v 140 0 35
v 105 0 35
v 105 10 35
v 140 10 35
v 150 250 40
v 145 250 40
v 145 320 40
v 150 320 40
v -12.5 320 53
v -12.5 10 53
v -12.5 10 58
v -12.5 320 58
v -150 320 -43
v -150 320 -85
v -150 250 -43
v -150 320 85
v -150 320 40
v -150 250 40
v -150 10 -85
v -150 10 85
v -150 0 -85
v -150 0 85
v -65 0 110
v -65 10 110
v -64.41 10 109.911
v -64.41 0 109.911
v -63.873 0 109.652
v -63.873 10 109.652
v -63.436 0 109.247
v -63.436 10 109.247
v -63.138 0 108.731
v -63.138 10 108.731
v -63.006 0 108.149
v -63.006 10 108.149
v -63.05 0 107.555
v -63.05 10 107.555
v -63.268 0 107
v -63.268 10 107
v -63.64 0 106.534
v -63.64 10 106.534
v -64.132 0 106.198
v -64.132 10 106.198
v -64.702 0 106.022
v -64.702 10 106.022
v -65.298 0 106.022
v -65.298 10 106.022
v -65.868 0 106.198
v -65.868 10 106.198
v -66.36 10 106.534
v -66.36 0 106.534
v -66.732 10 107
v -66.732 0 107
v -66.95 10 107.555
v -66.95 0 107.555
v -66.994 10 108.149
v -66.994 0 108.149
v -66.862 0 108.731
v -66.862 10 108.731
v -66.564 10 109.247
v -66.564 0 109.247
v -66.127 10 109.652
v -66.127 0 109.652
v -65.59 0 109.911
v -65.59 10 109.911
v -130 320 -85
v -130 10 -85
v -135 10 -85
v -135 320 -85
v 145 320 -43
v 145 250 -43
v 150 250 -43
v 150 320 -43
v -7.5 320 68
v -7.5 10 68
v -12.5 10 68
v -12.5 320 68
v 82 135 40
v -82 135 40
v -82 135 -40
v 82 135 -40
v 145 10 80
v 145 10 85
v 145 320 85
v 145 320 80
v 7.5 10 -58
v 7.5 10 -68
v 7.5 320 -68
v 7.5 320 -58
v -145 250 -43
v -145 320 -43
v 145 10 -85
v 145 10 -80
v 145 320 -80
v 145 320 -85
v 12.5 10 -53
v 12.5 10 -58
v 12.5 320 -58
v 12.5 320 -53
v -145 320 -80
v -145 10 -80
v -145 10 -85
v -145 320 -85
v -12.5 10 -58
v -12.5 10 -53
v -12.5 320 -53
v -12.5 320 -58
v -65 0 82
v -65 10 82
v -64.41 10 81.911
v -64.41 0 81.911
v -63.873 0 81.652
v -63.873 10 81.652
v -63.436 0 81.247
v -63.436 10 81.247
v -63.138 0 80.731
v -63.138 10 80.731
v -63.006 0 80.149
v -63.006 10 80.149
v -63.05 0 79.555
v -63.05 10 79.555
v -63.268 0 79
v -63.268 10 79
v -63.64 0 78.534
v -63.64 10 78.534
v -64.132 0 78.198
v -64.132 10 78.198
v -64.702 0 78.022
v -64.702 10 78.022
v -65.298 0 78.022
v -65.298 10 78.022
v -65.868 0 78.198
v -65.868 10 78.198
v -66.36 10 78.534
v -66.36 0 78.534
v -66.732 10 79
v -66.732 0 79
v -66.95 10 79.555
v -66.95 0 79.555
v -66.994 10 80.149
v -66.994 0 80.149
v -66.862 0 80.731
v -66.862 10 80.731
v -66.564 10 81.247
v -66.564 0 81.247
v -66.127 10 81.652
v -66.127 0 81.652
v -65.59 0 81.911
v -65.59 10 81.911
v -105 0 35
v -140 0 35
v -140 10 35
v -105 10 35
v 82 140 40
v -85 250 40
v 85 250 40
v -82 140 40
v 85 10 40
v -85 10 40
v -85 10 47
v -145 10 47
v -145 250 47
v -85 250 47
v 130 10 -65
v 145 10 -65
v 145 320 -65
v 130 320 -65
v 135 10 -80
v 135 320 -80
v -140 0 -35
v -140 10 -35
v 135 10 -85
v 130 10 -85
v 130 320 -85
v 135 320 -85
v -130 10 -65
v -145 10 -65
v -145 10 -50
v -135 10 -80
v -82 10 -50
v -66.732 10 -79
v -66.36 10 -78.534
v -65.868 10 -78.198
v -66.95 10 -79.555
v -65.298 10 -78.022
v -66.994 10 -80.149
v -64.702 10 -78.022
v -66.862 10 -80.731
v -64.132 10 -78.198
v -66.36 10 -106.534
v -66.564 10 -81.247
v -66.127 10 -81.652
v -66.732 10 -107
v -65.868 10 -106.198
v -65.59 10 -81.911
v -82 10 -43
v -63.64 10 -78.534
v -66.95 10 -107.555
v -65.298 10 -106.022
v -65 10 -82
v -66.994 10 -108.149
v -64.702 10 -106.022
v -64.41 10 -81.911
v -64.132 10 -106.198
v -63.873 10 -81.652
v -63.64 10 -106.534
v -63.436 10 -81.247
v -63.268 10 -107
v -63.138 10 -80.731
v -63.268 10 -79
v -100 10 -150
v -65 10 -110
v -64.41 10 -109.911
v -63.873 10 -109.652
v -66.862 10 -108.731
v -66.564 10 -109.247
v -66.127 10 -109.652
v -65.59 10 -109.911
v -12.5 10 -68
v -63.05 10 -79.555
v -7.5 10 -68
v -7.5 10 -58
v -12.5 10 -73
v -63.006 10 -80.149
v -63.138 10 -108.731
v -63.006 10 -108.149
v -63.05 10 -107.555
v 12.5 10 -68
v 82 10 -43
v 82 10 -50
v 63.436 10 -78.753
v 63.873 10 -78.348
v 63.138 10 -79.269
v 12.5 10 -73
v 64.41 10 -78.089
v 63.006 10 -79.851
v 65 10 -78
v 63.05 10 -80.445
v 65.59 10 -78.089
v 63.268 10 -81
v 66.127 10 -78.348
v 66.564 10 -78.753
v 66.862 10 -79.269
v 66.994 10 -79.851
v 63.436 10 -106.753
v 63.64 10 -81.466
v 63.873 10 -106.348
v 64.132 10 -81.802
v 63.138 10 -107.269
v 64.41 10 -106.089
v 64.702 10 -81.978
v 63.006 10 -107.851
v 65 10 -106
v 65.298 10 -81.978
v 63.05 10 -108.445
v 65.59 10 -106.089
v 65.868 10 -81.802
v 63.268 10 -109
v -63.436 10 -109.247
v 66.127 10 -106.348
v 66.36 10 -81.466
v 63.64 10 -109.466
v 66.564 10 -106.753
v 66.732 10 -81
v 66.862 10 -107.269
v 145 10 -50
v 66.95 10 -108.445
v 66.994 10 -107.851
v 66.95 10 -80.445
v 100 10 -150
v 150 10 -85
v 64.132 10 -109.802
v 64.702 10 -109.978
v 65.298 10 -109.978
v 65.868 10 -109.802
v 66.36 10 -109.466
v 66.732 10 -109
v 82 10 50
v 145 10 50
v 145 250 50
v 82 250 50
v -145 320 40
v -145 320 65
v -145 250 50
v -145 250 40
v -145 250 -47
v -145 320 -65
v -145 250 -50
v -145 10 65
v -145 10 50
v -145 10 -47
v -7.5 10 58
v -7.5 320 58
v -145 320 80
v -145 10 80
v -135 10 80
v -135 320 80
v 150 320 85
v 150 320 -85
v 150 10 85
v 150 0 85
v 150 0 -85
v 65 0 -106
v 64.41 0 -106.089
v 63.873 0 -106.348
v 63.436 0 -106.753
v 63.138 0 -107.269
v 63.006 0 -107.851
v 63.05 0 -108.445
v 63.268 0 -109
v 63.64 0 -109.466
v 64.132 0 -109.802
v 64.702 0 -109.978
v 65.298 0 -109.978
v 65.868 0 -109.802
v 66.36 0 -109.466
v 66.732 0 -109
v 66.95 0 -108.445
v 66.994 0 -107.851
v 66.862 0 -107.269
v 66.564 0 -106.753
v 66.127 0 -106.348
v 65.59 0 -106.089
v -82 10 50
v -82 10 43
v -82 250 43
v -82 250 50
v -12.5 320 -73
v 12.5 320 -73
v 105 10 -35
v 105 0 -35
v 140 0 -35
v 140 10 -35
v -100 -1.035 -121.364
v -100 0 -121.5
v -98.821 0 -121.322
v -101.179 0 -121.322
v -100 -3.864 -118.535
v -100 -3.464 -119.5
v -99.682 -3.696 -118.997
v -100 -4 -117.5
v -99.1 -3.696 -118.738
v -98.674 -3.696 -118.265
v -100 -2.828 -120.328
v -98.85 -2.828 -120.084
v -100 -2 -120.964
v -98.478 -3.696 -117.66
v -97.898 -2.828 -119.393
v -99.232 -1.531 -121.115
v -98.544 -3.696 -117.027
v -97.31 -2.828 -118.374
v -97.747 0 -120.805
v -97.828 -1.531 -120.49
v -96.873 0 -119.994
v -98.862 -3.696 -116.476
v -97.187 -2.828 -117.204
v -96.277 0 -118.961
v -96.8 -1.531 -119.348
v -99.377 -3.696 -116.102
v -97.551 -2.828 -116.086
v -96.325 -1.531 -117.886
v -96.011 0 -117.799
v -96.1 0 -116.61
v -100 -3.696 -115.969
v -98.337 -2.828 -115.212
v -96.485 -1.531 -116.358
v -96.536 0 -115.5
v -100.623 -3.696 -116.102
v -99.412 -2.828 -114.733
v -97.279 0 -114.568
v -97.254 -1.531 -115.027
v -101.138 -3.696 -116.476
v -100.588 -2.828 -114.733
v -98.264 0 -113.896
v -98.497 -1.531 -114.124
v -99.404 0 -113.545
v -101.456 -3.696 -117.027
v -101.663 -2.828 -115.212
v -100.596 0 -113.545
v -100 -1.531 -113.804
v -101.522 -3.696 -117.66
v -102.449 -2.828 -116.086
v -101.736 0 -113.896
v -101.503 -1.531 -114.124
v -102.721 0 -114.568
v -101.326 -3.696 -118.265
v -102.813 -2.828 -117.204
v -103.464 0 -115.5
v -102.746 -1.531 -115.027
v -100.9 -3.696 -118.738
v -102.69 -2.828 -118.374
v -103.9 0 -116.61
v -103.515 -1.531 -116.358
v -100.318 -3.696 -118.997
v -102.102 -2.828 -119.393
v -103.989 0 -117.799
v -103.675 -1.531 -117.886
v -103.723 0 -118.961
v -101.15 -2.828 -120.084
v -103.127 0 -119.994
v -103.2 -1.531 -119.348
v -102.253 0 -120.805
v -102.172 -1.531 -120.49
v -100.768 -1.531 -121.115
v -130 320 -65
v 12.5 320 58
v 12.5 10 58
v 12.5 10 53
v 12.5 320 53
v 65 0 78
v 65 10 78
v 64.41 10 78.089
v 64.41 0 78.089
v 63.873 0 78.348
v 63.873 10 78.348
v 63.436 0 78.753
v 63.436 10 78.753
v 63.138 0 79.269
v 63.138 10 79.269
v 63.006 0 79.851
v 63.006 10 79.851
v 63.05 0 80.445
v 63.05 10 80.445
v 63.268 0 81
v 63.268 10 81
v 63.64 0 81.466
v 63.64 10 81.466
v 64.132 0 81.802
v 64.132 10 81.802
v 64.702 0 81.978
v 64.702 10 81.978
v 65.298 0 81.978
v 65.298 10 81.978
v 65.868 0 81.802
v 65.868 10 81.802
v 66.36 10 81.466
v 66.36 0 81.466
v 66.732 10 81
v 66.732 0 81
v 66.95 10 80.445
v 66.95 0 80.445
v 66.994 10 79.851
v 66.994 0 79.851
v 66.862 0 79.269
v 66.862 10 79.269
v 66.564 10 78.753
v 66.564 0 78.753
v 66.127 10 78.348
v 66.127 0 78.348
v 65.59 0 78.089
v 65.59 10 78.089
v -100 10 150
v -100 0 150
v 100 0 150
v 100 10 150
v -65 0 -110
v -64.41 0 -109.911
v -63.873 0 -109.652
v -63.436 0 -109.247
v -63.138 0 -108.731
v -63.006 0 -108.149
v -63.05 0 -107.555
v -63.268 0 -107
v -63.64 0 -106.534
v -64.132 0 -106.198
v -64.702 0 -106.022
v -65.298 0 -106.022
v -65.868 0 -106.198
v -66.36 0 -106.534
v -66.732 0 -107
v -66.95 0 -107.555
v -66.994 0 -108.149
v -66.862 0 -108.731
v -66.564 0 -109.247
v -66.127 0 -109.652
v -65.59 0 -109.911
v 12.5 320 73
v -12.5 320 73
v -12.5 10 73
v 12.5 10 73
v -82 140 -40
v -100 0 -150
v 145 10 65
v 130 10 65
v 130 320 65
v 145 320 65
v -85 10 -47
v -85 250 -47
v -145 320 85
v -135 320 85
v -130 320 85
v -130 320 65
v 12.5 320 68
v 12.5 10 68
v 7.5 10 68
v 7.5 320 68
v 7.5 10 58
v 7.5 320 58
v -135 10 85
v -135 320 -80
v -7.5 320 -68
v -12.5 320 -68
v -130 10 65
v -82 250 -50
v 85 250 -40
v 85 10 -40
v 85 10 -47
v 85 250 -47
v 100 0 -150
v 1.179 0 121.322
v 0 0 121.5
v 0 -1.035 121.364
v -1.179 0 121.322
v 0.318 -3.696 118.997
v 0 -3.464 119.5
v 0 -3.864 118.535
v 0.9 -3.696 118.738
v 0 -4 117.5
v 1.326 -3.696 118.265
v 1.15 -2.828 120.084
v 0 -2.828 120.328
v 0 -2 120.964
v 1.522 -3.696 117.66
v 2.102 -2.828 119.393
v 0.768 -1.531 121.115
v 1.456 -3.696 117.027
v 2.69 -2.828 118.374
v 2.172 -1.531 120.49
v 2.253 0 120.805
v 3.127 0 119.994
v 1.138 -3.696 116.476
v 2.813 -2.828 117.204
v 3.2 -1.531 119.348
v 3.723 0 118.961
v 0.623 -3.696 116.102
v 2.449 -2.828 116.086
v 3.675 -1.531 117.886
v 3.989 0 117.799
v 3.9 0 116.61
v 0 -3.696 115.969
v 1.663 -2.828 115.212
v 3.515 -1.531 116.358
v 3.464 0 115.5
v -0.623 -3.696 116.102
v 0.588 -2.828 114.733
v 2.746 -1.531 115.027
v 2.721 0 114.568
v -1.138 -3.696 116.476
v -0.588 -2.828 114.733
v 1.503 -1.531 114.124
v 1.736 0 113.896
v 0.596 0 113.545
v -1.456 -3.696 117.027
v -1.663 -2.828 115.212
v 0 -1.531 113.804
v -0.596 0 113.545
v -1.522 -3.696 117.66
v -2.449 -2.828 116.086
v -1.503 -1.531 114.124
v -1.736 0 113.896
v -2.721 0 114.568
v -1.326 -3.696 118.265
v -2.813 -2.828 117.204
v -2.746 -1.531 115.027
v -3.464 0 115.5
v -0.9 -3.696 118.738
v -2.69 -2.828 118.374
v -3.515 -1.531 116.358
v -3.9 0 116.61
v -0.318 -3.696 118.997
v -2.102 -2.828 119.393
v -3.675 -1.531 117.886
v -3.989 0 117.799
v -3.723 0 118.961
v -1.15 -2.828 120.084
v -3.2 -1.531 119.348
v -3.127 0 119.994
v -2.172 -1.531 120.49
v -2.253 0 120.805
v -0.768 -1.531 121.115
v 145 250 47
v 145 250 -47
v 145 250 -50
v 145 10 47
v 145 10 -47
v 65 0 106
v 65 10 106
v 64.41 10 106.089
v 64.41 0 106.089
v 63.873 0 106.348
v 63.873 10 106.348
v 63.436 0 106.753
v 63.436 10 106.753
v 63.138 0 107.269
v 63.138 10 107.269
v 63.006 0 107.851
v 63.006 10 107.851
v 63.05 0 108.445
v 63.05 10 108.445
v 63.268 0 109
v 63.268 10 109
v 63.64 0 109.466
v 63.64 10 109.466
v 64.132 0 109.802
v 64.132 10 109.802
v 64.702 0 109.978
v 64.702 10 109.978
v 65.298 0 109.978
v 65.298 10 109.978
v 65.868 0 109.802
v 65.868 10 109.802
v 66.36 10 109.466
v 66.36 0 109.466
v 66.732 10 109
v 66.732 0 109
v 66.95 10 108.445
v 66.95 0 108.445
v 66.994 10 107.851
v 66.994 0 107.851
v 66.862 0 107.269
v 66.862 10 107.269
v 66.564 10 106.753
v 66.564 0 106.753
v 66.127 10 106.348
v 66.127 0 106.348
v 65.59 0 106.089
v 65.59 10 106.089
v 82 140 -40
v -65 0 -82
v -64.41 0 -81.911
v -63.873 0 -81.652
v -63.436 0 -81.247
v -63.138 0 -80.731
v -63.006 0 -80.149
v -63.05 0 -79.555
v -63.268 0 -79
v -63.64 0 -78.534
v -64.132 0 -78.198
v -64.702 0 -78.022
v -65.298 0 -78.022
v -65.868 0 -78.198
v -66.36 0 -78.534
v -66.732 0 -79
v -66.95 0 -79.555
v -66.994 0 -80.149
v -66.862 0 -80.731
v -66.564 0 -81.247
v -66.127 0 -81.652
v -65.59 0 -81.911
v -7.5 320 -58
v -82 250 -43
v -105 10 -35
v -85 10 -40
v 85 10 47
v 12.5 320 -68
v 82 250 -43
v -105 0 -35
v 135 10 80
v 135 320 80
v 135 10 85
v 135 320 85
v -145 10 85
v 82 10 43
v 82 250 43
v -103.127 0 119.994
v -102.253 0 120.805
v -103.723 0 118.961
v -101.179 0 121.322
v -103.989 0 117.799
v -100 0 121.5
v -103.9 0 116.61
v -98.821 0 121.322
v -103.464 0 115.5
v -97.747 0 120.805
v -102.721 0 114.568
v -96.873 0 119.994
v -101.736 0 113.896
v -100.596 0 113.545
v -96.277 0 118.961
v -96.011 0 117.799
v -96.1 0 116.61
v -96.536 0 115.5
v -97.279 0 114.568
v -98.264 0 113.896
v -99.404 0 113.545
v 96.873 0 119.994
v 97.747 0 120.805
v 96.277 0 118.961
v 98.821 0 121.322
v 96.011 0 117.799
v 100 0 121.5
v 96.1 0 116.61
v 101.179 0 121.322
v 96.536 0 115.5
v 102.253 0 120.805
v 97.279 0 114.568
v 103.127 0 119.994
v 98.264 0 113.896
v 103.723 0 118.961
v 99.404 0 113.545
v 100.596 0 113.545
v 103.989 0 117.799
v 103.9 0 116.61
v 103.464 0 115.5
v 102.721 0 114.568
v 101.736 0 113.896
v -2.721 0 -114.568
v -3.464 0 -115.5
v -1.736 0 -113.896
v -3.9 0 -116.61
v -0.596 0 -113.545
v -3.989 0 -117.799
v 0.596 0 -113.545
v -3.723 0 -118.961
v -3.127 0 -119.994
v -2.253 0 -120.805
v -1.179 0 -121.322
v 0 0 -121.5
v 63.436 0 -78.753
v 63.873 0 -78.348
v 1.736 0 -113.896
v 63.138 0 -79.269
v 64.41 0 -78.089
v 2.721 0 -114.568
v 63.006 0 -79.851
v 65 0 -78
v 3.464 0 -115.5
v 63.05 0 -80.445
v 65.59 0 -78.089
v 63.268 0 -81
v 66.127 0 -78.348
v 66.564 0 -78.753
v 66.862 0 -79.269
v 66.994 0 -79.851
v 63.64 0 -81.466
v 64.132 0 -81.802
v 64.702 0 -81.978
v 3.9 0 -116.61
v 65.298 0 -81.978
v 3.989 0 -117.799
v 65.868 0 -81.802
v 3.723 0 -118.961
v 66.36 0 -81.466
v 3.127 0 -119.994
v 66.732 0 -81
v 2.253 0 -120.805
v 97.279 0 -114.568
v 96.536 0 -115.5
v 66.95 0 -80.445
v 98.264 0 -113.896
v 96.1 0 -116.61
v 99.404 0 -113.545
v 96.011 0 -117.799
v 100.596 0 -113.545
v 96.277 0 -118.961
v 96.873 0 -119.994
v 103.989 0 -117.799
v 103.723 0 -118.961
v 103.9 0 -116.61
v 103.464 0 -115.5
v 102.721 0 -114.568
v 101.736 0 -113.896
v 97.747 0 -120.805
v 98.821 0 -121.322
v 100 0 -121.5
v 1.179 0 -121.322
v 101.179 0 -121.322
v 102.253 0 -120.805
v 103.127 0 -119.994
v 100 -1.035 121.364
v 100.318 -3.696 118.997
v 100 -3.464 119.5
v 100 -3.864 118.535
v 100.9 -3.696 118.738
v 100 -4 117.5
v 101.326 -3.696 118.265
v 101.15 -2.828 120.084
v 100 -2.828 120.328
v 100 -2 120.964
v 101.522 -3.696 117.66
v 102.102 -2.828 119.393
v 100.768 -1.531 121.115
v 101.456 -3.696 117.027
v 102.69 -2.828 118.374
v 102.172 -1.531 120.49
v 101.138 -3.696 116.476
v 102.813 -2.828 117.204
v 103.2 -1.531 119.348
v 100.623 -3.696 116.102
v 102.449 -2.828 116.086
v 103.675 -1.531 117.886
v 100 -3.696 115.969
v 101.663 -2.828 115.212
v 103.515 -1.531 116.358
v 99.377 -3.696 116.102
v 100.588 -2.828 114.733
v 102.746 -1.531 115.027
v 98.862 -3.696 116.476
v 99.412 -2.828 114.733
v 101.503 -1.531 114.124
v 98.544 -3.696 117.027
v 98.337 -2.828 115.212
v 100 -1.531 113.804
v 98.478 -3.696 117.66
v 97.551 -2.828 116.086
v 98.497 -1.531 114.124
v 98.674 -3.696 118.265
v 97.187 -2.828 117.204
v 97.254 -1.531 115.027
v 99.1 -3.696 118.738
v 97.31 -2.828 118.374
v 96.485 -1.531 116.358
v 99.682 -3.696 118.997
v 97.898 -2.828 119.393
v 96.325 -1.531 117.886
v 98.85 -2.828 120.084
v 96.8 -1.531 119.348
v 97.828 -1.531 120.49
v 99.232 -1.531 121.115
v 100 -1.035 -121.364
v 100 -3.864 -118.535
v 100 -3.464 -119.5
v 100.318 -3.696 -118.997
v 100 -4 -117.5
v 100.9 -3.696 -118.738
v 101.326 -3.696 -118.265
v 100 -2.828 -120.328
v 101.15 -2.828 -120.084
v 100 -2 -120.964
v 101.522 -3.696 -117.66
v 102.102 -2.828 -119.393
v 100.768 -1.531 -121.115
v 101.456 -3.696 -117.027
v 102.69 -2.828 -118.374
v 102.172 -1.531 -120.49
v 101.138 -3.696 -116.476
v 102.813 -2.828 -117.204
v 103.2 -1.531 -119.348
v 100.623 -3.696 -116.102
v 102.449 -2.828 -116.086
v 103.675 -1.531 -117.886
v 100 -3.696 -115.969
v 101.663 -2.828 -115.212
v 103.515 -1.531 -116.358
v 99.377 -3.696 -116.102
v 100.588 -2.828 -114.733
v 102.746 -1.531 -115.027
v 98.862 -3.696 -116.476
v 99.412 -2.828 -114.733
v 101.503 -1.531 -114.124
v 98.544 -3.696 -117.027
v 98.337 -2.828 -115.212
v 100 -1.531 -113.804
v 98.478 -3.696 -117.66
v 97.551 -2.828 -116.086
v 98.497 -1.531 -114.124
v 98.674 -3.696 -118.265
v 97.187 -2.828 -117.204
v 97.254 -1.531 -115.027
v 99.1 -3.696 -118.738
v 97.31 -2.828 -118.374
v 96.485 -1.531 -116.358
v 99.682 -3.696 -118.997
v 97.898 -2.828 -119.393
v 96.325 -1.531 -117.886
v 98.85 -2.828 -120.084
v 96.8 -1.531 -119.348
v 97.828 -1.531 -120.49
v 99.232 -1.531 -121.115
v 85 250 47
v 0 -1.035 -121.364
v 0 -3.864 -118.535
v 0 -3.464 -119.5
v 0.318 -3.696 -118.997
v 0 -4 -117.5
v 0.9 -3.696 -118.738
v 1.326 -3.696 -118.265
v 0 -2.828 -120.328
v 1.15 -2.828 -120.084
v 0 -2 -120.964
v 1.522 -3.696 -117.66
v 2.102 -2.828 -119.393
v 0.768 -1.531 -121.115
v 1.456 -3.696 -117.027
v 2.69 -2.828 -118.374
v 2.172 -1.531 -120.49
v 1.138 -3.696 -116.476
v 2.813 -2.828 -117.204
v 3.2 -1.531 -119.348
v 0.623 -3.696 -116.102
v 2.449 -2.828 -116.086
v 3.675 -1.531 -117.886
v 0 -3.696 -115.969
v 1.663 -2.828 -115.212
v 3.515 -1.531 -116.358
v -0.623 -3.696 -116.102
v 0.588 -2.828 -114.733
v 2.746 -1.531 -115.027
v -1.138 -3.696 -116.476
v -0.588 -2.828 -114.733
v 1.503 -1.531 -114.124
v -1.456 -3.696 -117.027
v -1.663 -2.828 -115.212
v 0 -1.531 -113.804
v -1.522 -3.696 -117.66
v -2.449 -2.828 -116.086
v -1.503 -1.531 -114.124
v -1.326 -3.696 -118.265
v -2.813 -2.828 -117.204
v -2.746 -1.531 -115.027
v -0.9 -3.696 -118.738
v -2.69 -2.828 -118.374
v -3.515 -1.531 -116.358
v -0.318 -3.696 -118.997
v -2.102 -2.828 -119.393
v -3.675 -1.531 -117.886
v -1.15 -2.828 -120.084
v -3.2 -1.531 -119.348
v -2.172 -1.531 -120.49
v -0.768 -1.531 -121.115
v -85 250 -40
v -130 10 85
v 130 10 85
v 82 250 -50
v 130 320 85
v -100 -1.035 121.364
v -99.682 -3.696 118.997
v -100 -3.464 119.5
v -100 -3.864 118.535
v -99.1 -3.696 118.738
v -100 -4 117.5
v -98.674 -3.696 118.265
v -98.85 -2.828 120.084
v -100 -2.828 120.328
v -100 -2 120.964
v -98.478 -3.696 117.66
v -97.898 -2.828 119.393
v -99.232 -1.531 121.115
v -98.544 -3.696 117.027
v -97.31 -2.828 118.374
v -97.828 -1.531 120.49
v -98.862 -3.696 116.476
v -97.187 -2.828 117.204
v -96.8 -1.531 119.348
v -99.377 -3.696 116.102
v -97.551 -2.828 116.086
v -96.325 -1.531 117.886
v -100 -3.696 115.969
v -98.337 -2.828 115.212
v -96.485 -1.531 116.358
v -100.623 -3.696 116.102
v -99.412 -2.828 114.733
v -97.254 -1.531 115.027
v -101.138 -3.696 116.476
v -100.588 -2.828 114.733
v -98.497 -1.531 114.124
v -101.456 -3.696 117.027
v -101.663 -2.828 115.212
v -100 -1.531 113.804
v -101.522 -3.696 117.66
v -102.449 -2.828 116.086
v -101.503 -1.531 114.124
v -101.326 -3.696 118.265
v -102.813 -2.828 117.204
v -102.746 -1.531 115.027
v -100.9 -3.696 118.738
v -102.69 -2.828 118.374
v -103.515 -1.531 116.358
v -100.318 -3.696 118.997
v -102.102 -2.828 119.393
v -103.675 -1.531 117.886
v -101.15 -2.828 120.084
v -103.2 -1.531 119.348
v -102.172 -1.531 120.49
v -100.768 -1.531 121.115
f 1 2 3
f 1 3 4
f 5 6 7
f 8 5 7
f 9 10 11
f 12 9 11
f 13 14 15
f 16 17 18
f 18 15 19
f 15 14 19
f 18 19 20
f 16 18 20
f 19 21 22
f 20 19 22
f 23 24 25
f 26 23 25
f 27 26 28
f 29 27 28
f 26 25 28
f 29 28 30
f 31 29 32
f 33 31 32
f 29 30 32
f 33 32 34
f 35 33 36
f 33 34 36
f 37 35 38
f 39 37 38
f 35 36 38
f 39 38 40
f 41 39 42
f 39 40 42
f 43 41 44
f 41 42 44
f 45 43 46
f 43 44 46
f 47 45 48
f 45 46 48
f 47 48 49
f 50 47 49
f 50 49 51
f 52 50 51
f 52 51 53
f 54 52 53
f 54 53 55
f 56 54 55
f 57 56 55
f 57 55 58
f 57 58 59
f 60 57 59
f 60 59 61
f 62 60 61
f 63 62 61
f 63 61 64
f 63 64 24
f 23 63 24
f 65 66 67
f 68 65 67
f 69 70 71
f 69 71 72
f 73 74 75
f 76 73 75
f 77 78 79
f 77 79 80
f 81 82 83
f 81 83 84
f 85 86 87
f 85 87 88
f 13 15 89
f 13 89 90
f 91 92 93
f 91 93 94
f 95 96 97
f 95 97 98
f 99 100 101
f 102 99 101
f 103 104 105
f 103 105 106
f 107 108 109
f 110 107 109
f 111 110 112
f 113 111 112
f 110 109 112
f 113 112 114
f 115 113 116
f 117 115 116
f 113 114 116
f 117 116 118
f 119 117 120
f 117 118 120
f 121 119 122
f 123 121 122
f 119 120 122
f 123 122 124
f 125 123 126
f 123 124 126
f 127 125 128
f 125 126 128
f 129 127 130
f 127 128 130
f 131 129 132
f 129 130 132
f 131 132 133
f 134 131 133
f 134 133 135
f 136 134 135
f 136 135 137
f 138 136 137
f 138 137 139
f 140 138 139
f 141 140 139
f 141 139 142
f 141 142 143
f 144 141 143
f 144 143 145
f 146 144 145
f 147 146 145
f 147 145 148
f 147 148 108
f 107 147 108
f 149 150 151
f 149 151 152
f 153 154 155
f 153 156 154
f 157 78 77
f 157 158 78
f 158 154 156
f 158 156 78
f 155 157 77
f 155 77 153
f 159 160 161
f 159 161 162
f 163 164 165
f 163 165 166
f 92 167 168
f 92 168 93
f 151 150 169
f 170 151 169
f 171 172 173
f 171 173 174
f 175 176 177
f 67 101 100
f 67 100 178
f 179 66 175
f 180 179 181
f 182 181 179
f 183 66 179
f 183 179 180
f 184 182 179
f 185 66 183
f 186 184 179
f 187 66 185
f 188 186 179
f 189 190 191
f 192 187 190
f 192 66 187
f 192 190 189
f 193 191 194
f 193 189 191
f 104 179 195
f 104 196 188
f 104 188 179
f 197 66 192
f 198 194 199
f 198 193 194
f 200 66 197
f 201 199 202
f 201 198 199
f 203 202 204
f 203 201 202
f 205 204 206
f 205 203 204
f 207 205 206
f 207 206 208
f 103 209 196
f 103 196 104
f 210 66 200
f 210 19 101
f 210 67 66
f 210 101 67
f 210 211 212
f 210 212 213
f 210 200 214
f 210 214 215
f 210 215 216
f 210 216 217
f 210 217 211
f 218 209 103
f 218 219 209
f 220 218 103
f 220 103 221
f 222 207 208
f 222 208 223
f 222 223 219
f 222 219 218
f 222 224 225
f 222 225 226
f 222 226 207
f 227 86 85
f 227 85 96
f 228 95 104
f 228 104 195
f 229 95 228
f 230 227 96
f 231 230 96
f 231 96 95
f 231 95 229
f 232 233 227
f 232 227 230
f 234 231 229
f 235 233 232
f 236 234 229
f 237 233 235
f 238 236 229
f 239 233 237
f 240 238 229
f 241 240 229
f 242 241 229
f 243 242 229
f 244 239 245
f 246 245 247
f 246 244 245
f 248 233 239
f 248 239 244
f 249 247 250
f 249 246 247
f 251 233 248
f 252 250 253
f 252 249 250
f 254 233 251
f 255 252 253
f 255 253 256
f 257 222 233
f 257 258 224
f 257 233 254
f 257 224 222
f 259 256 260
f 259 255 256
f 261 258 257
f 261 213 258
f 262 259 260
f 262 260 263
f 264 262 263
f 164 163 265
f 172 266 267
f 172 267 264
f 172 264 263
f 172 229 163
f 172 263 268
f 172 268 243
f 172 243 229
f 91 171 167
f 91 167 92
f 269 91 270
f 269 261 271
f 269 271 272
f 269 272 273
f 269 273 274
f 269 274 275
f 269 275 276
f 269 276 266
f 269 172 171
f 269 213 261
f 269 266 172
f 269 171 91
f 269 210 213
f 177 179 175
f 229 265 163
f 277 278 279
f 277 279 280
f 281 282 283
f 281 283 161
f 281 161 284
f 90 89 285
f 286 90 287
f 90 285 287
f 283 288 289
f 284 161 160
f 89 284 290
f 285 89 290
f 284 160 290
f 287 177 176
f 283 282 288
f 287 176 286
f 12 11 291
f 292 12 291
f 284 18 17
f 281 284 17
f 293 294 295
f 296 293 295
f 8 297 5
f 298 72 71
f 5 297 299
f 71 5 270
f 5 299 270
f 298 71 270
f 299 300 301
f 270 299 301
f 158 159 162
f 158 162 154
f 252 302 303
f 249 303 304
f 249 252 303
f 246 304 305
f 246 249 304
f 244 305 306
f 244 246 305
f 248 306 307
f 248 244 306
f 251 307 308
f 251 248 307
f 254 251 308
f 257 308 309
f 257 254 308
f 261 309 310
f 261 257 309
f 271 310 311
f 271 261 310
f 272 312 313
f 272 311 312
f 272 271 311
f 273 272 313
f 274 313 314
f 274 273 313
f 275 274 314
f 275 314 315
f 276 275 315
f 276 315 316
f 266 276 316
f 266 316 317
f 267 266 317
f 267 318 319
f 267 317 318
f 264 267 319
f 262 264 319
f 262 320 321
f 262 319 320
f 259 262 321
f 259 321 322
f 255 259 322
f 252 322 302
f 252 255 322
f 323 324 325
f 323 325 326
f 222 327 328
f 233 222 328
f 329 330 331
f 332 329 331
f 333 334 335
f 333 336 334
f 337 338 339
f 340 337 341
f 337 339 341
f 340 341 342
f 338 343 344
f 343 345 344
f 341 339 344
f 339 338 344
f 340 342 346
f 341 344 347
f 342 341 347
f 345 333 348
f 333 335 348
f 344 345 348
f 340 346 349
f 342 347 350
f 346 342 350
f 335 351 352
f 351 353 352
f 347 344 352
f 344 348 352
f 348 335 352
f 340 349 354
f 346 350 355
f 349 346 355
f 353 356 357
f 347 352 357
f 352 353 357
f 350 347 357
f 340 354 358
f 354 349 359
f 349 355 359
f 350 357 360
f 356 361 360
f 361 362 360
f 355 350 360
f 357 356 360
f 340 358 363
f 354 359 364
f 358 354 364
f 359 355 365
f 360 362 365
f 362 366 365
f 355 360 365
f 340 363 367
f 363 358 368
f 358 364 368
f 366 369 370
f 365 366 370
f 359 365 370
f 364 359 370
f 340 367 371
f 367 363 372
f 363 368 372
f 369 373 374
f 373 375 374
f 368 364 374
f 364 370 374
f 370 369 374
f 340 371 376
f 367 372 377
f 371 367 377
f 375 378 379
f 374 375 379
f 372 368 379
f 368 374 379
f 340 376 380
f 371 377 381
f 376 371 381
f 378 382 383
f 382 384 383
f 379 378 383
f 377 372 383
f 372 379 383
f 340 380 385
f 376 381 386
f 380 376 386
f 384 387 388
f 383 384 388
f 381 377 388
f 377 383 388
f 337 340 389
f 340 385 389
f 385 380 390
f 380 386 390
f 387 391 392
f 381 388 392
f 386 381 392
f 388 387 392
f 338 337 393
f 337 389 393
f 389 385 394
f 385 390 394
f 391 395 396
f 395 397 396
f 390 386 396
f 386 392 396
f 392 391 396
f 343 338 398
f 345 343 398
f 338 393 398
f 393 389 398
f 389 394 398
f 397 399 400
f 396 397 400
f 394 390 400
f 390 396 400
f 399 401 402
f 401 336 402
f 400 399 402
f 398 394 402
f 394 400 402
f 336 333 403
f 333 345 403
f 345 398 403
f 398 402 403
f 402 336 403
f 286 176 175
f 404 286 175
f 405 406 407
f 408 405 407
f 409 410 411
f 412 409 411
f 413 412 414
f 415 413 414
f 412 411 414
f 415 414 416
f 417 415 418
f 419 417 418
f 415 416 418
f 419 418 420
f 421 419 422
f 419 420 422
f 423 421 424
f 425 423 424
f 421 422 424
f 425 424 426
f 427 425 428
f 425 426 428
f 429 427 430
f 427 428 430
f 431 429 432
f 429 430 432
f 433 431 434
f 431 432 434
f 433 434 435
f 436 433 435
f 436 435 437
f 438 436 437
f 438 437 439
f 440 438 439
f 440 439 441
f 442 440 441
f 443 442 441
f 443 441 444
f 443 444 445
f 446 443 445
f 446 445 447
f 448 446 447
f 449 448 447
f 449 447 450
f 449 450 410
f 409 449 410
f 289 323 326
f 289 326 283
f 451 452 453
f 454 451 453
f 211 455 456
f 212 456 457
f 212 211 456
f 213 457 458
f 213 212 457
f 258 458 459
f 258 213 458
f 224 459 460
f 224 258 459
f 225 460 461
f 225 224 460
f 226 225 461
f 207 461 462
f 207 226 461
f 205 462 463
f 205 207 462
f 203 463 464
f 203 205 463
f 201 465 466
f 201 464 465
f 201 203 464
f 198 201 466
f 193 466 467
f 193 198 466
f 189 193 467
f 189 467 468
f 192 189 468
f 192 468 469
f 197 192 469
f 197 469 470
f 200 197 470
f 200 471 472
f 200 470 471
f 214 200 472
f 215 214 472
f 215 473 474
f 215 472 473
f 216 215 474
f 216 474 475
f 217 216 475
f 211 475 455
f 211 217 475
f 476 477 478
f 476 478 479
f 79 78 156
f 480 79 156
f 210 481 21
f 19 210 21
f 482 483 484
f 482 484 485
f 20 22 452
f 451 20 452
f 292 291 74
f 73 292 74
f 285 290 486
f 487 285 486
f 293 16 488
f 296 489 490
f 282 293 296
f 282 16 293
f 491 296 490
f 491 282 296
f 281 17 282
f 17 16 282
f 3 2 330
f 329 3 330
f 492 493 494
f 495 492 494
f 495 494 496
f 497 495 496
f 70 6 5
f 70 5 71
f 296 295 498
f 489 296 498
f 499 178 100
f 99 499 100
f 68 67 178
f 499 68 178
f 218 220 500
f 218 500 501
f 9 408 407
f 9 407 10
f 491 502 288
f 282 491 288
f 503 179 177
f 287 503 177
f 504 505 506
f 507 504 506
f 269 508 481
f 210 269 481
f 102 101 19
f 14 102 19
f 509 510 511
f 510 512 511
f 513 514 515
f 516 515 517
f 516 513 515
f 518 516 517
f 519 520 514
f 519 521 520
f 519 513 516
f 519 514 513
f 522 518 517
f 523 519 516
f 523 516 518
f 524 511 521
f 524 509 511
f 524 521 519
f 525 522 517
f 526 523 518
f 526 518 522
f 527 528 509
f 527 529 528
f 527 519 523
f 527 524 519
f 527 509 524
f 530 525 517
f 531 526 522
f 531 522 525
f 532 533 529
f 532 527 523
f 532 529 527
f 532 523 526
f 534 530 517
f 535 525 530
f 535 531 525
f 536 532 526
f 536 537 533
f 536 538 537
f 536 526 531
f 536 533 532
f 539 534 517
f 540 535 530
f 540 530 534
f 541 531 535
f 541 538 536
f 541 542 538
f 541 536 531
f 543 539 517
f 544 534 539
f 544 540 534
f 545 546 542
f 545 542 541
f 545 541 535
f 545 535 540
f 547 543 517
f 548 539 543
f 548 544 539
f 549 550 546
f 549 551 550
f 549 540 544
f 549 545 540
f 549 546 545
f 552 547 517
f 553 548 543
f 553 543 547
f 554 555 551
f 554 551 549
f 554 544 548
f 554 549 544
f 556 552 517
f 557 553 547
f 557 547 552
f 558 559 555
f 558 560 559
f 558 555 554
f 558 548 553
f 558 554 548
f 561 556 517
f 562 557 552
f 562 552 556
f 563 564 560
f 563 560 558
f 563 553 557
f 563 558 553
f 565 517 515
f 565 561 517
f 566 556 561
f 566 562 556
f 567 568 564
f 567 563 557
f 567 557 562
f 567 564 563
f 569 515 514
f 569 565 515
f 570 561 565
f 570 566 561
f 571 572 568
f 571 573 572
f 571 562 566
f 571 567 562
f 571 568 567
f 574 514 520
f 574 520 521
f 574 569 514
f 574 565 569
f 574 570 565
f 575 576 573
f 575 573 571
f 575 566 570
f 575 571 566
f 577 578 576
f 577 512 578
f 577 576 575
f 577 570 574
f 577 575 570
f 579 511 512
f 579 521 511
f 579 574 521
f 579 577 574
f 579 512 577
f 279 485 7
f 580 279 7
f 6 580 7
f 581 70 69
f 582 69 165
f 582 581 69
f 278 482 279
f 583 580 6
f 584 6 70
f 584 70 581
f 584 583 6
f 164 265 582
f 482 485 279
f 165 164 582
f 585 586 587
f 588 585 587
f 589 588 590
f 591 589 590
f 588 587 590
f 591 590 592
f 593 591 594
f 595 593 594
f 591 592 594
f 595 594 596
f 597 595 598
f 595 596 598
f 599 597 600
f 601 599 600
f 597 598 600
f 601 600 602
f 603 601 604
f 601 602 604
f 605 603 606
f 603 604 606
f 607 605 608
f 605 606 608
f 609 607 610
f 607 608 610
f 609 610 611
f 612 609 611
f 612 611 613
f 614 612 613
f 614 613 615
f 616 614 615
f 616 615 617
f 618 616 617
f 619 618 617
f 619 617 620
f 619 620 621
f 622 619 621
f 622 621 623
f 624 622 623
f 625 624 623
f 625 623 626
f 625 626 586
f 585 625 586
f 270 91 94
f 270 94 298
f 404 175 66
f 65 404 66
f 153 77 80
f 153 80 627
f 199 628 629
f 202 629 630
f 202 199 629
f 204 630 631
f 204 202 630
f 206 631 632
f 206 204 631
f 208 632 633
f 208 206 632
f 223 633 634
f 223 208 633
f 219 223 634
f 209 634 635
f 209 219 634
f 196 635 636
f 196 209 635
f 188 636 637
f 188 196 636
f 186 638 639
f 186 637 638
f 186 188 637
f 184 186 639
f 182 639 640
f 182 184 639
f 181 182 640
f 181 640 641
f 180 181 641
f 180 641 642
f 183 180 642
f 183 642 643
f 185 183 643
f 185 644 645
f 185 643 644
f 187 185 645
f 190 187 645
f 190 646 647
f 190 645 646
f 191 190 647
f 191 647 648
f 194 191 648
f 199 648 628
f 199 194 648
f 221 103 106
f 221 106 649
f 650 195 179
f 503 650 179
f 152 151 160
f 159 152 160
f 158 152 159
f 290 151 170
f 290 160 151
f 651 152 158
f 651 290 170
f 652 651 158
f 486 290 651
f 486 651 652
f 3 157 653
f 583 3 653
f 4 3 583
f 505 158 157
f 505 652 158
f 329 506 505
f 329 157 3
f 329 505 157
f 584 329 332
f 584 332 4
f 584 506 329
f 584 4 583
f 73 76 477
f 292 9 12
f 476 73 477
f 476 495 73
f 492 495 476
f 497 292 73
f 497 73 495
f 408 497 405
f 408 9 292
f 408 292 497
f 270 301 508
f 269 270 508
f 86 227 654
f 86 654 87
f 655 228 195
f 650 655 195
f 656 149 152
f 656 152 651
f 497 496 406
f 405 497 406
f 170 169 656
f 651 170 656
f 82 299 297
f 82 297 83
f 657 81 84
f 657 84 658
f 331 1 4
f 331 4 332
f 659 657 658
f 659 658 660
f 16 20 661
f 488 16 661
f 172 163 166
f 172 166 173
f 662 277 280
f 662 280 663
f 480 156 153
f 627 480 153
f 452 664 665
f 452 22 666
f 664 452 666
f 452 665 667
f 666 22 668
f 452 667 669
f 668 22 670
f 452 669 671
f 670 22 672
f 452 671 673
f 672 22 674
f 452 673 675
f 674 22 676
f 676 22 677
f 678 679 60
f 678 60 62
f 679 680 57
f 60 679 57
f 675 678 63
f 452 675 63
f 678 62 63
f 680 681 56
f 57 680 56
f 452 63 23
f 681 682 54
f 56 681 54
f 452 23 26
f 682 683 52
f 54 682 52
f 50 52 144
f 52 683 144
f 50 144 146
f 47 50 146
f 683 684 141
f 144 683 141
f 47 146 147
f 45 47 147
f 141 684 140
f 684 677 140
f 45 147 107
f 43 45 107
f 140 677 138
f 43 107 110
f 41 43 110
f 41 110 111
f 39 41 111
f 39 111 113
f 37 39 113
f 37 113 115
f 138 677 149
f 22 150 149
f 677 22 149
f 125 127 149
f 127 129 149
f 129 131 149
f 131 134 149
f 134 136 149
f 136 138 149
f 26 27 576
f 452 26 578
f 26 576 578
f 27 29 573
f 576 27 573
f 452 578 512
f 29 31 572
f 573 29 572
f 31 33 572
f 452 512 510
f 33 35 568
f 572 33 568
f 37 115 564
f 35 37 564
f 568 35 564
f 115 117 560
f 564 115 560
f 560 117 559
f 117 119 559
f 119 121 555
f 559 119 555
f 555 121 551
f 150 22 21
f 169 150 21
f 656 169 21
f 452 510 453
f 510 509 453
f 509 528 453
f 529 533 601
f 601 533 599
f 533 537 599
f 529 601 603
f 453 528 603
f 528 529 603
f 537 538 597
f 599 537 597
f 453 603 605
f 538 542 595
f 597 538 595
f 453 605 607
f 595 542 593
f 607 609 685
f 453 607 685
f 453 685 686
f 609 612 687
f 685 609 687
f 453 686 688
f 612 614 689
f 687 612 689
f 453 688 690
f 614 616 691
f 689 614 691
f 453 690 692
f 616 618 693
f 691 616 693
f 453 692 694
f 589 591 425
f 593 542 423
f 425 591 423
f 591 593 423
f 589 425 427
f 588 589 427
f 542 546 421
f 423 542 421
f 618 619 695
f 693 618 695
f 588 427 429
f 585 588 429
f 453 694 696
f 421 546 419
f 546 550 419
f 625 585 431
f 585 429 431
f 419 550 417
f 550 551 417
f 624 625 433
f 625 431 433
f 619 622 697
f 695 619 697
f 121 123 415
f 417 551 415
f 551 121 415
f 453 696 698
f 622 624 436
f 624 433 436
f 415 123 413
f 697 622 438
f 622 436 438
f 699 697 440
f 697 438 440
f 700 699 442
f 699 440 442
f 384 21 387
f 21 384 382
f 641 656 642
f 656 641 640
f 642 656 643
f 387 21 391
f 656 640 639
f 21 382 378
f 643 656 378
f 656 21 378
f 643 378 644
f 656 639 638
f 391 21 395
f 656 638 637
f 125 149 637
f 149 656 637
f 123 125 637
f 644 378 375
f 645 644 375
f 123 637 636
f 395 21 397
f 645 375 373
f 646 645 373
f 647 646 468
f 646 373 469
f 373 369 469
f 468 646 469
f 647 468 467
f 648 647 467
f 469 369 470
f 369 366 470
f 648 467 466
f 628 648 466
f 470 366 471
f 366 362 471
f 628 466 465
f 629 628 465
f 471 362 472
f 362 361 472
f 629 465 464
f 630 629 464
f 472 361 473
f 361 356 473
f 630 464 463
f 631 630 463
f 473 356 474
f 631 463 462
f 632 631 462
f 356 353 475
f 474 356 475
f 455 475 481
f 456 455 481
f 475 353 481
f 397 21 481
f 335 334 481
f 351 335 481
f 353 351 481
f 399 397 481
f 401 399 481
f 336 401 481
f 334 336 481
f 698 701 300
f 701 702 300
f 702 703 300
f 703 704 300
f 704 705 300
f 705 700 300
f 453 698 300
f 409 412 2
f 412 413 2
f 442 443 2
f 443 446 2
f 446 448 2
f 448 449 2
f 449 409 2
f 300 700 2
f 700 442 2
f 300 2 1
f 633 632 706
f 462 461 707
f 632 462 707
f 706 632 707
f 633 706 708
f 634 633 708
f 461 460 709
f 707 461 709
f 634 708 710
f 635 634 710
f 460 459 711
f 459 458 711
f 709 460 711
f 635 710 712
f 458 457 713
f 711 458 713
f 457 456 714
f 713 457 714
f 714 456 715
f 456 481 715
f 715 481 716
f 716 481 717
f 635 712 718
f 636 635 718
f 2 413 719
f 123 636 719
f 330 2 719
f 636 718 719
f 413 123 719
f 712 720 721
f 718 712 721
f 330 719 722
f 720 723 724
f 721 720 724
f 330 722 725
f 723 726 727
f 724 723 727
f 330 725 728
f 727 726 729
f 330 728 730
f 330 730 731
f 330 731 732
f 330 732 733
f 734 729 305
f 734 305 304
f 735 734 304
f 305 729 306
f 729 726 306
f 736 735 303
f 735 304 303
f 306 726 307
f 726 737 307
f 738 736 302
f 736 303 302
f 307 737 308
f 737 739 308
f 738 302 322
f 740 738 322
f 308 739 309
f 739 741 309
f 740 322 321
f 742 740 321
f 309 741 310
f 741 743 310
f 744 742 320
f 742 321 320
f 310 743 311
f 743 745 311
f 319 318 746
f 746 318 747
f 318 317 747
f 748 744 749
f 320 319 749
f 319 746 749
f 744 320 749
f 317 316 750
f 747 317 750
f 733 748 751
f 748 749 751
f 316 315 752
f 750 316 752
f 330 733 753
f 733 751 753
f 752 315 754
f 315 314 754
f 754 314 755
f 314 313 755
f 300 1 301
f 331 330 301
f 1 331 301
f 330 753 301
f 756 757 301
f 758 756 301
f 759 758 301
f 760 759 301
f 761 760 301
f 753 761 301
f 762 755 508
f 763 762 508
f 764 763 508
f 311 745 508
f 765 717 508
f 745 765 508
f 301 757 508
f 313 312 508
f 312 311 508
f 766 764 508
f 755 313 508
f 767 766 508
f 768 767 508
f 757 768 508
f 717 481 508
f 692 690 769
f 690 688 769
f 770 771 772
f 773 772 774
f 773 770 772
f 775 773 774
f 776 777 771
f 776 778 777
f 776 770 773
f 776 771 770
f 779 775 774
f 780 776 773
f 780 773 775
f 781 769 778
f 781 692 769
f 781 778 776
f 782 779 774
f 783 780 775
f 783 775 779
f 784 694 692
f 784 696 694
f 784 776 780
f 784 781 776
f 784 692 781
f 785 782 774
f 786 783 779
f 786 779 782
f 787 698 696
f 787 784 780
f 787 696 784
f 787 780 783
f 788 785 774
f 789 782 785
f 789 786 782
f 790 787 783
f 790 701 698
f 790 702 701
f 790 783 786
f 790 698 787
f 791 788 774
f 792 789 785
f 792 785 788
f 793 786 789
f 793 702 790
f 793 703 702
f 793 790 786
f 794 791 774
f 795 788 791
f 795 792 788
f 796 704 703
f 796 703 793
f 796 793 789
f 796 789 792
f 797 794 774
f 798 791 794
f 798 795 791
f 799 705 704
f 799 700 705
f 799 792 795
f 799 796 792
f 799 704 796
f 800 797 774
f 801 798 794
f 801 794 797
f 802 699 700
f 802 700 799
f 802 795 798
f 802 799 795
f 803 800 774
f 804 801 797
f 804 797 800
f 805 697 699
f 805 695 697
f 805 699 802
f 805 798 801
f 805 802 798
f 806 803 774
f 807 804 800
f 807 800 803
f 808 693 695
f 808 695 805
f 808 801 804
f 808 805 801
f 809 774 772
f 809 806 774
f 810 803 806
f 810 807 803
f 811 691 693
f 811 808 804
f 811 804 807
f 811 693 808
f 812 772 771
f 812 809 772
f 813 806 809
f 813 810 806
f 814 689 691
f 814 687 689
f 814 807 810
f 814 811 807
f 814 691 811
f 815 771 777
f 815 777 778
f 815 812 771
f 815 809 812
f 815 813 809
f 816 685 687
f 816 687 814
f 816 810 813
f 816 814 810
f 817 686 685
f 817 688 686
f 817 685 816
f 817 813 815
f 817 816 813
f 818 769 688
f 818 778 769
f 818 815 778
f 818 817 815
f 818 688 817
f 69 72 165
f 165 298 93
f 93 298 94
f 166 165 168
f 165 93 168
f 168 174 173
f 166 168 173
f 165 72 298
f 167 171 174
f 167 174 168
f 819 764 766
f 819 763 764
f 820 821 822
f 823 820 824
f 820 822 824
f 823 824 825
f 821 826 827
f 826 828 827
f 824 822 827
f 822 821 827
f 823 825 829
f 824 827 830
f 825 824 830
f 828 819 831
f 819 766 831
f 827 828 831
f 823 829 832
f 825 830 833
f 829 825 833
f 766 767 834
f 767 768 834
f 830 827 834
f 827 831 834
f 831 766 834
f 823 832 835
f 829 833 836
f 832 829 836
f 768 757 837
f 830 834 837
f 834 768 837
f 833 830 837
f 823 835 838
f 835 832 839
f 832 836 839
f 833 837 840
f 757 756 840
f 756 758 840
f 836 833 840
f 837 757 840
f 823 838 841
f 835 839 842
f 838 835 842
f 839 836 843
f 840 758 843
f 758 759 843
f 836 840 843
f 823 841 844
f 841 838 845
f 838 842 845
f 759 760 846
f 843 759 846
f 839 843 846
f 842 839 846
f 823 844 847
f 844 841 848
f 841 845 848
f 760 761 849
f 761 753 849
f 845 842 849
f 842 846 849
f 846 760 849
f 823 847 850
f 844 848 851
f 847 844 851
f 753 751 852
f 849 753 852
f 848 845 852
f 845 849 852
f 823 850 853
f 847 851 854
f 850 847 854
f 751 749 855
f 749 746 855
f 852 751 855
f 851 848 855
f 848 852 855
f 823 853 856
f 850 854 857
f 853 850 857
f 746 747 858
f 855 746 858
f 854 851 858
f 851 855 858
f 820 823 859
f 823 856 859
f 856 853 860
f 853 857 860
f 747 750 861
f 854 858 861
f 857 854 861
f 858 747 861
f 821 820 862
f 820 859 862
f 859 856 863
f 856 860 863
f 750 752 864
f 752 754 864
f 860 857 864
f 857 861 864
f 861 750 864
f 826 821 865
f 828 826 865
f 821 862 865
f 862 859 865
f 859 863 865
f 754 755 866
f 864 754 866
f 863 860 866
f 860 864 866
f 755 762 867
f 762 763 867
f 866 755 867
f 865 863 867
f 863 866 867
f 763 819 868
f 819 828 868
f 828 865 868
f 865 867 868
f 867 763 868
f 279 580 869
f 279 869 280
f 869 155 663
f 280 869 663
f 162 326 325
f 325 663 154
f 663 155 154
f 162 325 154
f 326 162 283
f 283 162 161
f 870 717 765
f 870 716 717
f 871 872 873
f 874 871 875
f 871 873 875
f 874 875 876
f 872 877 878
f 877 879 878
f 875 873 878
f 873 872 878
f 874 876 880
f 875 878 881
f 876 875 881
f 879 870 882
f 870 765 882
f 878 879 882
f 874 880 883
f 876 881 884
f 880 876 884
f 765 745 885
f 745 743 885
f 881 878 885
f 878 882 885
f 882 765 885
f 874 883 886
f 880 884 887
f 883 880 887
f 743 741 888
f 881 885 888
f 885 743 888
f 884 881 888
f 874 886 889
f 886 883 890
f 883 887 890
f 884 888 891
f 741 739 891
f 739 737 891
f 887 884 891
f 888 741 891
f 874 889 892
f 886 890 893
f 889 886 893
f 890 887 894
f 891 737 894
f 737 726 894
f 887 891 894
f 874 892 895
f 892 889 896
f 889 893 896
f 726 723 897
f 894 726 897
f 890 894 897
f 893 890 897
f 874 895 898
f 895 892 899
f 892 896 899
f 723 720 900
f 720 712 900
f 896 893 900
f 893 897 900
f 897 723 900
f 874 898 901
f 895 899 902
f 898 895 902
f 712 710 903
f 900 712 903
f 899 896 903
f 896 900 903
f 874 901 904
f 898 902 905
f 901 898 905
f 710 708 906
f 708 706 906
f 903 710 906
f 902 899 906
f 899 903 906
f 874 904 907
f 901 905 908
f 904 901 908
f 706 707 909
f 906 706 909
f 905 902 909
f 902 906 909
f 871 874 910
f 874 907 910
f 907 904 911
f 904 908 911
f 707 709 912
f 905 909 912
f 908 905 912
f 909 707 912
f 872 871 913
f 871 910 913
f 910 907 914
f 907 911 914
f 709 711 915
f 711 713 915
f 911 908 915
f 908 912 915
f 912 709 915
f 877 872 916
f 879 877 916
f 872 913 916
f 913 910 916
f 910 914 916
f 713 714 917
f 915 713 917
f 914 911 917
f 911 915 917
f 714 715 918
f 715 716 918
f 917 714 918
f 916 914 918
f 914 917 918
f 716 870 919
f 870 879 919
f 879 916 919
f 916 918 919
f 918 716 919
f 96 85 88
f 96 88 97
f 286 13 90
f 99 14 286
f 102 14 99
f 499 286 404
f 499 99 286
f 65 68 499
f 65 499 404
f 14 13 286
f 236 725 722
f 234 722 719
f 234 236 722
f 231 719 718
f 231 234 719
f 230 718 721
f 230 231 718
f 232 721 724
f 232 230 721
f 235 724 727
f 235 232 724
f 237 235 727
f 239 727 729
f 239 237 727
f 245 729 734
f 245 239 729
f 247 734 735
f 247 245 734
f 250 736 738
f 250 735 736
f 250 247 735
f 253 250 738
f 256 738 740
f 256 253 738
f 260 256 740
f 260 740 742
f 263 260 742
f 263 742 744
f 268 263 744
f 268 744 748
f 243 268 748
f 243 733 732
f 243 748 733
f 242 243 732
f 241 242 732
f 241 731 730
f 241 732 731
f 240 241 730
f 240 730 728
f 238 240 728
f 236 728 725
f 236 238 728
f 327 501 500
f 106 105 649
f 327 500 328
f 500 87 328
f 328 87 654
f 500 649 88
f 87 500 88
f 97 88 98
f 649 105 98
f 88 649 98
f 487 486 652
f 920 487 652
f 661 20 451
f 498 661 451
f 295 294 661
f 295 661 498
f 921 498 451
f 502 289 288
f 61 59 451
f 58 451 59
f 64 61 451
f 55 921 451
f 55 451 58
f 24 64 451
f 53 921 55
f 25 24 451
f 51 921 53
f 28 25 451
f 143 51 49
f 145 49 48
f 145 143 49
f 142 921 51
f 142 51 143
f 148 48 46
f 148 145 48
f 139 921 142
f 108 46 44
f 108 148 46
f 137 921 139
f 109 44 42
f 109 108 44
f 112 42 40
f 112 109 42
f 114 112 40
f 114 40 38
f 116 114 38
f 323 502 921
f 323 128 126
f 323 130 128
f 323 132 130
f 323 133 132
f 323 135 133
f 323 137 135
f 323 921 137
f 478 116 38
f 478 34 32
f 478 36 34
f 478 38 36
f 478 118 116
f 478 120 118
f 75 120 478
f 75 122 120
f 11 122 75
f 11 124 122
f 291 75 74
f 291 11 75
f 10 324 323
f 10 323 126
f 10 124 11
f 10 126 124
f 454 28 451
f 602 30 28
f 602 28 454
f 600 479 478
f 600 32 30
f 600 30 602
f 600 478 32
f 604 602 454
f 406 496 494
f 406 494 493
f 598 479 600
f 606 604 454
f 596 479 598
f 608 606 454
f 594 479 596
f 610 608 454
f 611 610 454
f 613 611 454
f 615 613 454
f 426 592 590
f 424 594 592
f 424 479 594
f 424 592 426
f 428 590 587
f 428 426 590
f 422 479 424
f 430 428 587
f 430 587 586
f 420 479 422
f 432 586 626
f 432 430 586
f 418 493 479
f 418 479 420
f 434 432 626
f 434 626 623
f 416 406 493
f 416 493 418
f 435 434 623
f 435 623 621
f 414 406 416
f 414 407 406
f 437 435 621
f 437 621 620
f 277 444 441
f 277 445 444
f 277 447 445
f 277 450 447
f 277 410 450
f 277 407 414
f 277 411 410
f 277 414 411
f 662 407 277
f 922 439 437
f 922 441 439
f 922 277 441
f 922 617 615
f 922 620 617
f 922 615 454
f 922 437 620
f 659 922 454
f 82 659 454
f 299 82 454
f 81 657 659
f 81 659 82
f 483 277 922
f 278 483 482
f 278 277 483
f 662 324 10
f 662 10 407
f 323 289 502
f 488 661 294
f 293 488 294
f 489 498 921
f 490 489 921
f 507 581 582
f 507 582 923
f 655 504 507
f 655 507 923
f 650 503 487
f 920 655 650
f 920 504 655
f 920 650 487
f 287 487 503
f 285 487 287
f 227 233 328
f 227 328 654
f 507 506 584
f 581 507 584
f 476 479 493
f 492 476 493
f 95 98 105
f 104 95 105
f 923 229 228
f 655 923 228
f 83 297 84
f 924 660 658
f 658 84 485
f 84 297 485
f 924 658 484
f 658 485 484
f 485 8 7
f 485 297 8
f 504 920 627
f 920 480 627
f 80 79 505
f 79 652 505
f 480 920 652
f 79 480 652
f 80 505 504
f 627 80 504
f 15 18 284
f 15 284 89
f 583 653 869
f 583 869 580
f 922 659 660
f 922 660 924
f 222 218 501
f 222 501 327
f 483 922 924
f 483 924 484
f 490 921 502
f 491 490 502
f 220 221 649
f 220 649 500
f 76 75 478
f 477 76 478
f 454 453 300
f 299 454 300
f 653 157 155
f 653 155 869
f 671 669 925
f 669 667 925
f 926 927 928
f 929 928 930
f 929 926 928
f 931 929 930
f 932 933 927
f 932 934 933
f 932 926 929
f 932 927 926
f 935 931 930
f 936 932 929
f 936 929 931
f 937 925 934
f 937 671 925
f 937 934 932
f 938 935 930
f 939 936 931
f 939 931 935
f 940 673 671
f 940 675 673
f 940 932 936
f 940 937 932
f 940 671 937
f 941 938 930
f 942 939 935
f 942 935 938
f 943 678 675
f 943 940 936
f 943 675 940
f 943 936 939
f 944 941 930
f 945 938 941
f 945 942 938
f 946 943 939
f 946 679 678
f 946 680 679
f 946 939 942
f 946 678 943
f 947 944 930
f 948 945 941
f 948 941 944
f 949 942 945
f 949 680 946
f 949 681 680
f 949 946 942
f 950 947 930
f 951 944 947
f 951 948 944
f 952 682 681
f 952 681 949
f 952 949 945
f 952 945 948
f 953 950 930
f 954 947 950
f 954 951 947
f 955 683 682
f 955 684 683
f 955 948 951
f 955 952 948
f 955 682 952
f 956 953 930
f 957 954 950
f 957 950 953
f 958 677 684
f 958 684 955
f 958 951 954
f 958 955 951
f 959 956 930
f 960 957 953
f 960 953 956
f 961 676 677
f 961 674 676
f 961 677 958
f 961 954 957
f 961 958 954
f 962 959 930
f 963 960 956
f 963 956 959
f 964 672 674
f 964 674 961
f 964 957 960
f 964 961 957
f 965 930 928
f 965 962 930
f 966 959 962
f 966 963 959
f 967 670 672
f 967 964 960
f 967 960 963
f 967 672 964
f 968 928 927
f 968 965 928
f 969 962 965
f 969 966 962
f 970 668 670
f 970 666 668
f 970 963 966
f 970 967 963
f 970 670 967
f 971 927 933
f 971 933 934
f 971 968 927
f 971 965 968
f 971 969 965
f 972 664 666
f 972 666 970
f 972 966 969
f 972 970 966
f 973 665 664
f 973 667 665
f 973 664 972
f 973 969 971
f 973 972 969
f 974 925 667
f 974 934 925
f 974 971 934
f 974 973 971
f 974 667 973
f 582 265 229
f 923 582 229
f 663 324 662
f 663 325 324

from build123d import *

# Parameters (mm, degrees)
SKETCH1_W               = 35
SKETCH1_H               = 70
BOSS_EXTRUDE1_DEPTH     = 10
BOSS_EXTRUDE3_DEPTH     = 310
BOSS_EXTRUDE4_DEPTH     = 240
SKETCH6_R               = 2
CUT_EXTRUDE1_DEPTH      = 280
LPATTERN1_COUNT         = 2
LPATTERN1_PITCH         = 100
LPATTERN1_COL_COUNT     = 2
LPATTERN1_COL_PITCH     = 100
CUT_EXTRUDE2_DEPTH      = 295
CUT_EXTRUDE2_DEPTH_BACK = 10
SKETCH10_W              = 83
SKETCH10_H              = 70
SKETCH11_W              = 164
SKETCH11_H              = 5
BOSS_EXTRUDE5_DEPTH     = 86


with BuildPart() as part:
    # Sketch1 → Boss-Extrude1 (new body)
    with BuildSketch(Plane(origin=(0, 0, 0), x_dir=(1, 0, 0), z_dir=(0, 1, 0))):
        Polygon((-100, 150), (-150, 85), (-150, -85), (-100, -150), (100, -150), (150, -85), (150, 85), (100, 150), align=None)
        with Locations((-122.5, 0)):
            Rectangle(SKETCH1_W, SKETCH1_H, mode=Mode.SUBTRACT)
        with Locations((122.5, 0)):
            Rectangle(SKETCH1_W, SKETCH1_H, mode=Mode.SUBTRACT)
    extrude(amount=BOSS_EXTRUDE1_DEPTH)

    # Sketch4 → Boss-Extrude3 (add)
    with BuildSketch(Plane(origin=(0, 10, 0), x_dir=(1, 0, 0), z_dir=(0, 1, 0))):
        Polygon((-12.5, -73), (12.5, -73), (12.5, -68), (7.5, -68), (7.5, -58), (12.5, -58), (12.5, -53), (-12.5, -53), (-12.5, -58), (-7.5, -58), (-7.5, -68), (-12.5, -68), align=None)
        Polygon((-150, 85), (-150, -85), (-145, -85), (-145, -80), (-135, -80), (-135, -85), (-130, -85), (-130, -65), (-145, -65), (-145, 65), (-130, 65), (-130, 85), (-135, 85), (-135, 80), (-145, 80), (-145, 85), align=None)
        Polygon((145, 85), (150, 85), (150, -85), (145, -85), (145, -80), (135, -80), (135, -85), (130, -85), (130, -65), (145, -65), (145, 65), (130, 65), (130, 85), (135, 85), (135, 80), (145, 80), align=None)
    boss_extrude3 = extrude(amount=BOSS_EXTRUDE3_DEPTH)

    # Sketch5 → Boss-Extrude4 (add)
    with BuildSketch(Plane(origin=(0, 10, 0), x_dir=(1, 0, 0), z_dir=(0, 1, 0))):
        Polygon((-145, -47), (-85, -47), (-85, -40), (85, -40), (85, -47), (145, -47), (145, -50), (82, -50), (82, -43), (-82, -43), (-82, -50), (-145, -50), align=None)
    boss_extrude4 = extrude(amount=BOSS_EXTRUDE4_DEPTH)

    # Sketch6 → Cut-Extrude1 (cut)
    with BuildSketch(Plane(origin=(0, 10, 0), x_dir=(1, 0, 0), z_dir=(0, 1, 0))):
        with Locations(Location((-65, -80, 0), (0, 0, 270))):
            Circle(SKETCH6_R)
        with Locations(Location((-65, -108, 0), (0, 0, 270))):
            Circle(SKETCH6_R)
        with Locations(Location((65, -108, 0), (0, 0, 90))):
            Circle(SKETCH6_R)
        with Locations(Location((65, -80, 0), (0, 0, 90))):
            Circle(SKETCH6_R)
    cut_extrude1 = extrude(amount=-CUT_EXTRUDE1_DEPTH, mode=Mode.SUBTRACT)

    # Mirror1: Boss-Extrude3, Boss-Extrude4, Cut-Extrude1 across plane
    add(boss_extrude3.mirror(Plane.XY))
    add(boss_extrude4.mirror(Plane.XY))
    add(cut_extrude1.mirror(Plane.XY), mode=Mode.SUBTRACT)

    # Sketch9 → Revolve1 (revolve)
    with BuildSketch(Plane(origin=(0, 0, 0), x_dir=(0, 0, -1), z_dir=(1, 0, 0))):
        with BuildLine():
            Line((117.5, 0), (117.5, -4))
            ThreePointArc((117.5, -4), (120.328427125, -2.828427125), (121.5, 0))
            Line((121.5, 0), (117.5, 0))
        make_face()
    revolve1 = revolve(axis=Axis((0, 0, -117.5), (0, -1, 0)))

    # LPattern1: Revolve1 ×2
    with Locations(*[(-i * LPATTERN1_PITCH, 0, 0) for i in range(1, LPATTERN1_COUNT)]):
        add(revolve1)

    # LPattern1 col: Revolve1 ×2
    with Locations(*[(i * LPATTERN1_COL_PITCH, 0, 0) for i in range(1, LPATTERN1_COL_COUNT)]):
        add(revolve1)

    # Mirror2: Revolve1 across plane
    add(revolve1.mirror(Plane.XY))

    # Mirror2 copy 1 sketch → Mirror2 copy 1 (revolve)
    with BuildSketch(Plane(origin=(-100, 0, 0), x_dir=(0, 0, 1), z_dir=(1, 0, 0))):
        with BuildLine():
            Line((117.5, 0), (117.5, 4))
            ThreePointArc((117.5, 4), (120.328427125, 2.828427125), (121.5, 0))
            Line((121.5, 0), (117.5, 0))
        make_face()
    revolve(axis=Axis((-100, 0, 117.5), (0, 1, 0)))

    # Mirror2 copy 2 sketch → Mirror2 copy 2 (revolve)
    with BuildSketch(Plane(origin=(100, 0, 0), x_dir=(0, 0, 1), z_dir=(1, 0, 0))):
        with BuildLine():
            Line((117.5, 0), (117.5, 4))
            ThreePointArc((117.5, 4), (120.328427125, 2.828427125), (121.5, 0))
            Line((121.5, 0), (117.5, 0))
        make_face()
    revolve(axis=Axis((100, 0, 117.5), (0, 1, 0)))

    # Sketch10 → Cut-Extrude2 (cut, two sides: drawn at the far end of the back side and taken through both)
    with BuildSketch(Plane(origin=(-145, 0, 0), x_dir=(0, 0, -1), z_dir=(1, 0, 0)).offset(-CUT_EXTRUDE2_DEPTH_BACK)):
        with Locations((1.5, 285)):
            Rectangle(SKETCH10_W, SKETCH10_H)
    extrude(amount=CUT_EXTRUDE2_DEPTH + CUT_EXTRUDE2_DEPTH_BACK, mode=Mode.SUBTRACT)

    # Sketch11 → Boss-Extrude5 (add)
    with BuildSketch(Plane.XY.offset(43)):
        with Locations((0, 137.5)):
            Rectangle(SKETCH11_W, SKETCH11_H)
    extrude(amount=-BOSS_EXTRUDE5_DEPTH)


solid = part.part
